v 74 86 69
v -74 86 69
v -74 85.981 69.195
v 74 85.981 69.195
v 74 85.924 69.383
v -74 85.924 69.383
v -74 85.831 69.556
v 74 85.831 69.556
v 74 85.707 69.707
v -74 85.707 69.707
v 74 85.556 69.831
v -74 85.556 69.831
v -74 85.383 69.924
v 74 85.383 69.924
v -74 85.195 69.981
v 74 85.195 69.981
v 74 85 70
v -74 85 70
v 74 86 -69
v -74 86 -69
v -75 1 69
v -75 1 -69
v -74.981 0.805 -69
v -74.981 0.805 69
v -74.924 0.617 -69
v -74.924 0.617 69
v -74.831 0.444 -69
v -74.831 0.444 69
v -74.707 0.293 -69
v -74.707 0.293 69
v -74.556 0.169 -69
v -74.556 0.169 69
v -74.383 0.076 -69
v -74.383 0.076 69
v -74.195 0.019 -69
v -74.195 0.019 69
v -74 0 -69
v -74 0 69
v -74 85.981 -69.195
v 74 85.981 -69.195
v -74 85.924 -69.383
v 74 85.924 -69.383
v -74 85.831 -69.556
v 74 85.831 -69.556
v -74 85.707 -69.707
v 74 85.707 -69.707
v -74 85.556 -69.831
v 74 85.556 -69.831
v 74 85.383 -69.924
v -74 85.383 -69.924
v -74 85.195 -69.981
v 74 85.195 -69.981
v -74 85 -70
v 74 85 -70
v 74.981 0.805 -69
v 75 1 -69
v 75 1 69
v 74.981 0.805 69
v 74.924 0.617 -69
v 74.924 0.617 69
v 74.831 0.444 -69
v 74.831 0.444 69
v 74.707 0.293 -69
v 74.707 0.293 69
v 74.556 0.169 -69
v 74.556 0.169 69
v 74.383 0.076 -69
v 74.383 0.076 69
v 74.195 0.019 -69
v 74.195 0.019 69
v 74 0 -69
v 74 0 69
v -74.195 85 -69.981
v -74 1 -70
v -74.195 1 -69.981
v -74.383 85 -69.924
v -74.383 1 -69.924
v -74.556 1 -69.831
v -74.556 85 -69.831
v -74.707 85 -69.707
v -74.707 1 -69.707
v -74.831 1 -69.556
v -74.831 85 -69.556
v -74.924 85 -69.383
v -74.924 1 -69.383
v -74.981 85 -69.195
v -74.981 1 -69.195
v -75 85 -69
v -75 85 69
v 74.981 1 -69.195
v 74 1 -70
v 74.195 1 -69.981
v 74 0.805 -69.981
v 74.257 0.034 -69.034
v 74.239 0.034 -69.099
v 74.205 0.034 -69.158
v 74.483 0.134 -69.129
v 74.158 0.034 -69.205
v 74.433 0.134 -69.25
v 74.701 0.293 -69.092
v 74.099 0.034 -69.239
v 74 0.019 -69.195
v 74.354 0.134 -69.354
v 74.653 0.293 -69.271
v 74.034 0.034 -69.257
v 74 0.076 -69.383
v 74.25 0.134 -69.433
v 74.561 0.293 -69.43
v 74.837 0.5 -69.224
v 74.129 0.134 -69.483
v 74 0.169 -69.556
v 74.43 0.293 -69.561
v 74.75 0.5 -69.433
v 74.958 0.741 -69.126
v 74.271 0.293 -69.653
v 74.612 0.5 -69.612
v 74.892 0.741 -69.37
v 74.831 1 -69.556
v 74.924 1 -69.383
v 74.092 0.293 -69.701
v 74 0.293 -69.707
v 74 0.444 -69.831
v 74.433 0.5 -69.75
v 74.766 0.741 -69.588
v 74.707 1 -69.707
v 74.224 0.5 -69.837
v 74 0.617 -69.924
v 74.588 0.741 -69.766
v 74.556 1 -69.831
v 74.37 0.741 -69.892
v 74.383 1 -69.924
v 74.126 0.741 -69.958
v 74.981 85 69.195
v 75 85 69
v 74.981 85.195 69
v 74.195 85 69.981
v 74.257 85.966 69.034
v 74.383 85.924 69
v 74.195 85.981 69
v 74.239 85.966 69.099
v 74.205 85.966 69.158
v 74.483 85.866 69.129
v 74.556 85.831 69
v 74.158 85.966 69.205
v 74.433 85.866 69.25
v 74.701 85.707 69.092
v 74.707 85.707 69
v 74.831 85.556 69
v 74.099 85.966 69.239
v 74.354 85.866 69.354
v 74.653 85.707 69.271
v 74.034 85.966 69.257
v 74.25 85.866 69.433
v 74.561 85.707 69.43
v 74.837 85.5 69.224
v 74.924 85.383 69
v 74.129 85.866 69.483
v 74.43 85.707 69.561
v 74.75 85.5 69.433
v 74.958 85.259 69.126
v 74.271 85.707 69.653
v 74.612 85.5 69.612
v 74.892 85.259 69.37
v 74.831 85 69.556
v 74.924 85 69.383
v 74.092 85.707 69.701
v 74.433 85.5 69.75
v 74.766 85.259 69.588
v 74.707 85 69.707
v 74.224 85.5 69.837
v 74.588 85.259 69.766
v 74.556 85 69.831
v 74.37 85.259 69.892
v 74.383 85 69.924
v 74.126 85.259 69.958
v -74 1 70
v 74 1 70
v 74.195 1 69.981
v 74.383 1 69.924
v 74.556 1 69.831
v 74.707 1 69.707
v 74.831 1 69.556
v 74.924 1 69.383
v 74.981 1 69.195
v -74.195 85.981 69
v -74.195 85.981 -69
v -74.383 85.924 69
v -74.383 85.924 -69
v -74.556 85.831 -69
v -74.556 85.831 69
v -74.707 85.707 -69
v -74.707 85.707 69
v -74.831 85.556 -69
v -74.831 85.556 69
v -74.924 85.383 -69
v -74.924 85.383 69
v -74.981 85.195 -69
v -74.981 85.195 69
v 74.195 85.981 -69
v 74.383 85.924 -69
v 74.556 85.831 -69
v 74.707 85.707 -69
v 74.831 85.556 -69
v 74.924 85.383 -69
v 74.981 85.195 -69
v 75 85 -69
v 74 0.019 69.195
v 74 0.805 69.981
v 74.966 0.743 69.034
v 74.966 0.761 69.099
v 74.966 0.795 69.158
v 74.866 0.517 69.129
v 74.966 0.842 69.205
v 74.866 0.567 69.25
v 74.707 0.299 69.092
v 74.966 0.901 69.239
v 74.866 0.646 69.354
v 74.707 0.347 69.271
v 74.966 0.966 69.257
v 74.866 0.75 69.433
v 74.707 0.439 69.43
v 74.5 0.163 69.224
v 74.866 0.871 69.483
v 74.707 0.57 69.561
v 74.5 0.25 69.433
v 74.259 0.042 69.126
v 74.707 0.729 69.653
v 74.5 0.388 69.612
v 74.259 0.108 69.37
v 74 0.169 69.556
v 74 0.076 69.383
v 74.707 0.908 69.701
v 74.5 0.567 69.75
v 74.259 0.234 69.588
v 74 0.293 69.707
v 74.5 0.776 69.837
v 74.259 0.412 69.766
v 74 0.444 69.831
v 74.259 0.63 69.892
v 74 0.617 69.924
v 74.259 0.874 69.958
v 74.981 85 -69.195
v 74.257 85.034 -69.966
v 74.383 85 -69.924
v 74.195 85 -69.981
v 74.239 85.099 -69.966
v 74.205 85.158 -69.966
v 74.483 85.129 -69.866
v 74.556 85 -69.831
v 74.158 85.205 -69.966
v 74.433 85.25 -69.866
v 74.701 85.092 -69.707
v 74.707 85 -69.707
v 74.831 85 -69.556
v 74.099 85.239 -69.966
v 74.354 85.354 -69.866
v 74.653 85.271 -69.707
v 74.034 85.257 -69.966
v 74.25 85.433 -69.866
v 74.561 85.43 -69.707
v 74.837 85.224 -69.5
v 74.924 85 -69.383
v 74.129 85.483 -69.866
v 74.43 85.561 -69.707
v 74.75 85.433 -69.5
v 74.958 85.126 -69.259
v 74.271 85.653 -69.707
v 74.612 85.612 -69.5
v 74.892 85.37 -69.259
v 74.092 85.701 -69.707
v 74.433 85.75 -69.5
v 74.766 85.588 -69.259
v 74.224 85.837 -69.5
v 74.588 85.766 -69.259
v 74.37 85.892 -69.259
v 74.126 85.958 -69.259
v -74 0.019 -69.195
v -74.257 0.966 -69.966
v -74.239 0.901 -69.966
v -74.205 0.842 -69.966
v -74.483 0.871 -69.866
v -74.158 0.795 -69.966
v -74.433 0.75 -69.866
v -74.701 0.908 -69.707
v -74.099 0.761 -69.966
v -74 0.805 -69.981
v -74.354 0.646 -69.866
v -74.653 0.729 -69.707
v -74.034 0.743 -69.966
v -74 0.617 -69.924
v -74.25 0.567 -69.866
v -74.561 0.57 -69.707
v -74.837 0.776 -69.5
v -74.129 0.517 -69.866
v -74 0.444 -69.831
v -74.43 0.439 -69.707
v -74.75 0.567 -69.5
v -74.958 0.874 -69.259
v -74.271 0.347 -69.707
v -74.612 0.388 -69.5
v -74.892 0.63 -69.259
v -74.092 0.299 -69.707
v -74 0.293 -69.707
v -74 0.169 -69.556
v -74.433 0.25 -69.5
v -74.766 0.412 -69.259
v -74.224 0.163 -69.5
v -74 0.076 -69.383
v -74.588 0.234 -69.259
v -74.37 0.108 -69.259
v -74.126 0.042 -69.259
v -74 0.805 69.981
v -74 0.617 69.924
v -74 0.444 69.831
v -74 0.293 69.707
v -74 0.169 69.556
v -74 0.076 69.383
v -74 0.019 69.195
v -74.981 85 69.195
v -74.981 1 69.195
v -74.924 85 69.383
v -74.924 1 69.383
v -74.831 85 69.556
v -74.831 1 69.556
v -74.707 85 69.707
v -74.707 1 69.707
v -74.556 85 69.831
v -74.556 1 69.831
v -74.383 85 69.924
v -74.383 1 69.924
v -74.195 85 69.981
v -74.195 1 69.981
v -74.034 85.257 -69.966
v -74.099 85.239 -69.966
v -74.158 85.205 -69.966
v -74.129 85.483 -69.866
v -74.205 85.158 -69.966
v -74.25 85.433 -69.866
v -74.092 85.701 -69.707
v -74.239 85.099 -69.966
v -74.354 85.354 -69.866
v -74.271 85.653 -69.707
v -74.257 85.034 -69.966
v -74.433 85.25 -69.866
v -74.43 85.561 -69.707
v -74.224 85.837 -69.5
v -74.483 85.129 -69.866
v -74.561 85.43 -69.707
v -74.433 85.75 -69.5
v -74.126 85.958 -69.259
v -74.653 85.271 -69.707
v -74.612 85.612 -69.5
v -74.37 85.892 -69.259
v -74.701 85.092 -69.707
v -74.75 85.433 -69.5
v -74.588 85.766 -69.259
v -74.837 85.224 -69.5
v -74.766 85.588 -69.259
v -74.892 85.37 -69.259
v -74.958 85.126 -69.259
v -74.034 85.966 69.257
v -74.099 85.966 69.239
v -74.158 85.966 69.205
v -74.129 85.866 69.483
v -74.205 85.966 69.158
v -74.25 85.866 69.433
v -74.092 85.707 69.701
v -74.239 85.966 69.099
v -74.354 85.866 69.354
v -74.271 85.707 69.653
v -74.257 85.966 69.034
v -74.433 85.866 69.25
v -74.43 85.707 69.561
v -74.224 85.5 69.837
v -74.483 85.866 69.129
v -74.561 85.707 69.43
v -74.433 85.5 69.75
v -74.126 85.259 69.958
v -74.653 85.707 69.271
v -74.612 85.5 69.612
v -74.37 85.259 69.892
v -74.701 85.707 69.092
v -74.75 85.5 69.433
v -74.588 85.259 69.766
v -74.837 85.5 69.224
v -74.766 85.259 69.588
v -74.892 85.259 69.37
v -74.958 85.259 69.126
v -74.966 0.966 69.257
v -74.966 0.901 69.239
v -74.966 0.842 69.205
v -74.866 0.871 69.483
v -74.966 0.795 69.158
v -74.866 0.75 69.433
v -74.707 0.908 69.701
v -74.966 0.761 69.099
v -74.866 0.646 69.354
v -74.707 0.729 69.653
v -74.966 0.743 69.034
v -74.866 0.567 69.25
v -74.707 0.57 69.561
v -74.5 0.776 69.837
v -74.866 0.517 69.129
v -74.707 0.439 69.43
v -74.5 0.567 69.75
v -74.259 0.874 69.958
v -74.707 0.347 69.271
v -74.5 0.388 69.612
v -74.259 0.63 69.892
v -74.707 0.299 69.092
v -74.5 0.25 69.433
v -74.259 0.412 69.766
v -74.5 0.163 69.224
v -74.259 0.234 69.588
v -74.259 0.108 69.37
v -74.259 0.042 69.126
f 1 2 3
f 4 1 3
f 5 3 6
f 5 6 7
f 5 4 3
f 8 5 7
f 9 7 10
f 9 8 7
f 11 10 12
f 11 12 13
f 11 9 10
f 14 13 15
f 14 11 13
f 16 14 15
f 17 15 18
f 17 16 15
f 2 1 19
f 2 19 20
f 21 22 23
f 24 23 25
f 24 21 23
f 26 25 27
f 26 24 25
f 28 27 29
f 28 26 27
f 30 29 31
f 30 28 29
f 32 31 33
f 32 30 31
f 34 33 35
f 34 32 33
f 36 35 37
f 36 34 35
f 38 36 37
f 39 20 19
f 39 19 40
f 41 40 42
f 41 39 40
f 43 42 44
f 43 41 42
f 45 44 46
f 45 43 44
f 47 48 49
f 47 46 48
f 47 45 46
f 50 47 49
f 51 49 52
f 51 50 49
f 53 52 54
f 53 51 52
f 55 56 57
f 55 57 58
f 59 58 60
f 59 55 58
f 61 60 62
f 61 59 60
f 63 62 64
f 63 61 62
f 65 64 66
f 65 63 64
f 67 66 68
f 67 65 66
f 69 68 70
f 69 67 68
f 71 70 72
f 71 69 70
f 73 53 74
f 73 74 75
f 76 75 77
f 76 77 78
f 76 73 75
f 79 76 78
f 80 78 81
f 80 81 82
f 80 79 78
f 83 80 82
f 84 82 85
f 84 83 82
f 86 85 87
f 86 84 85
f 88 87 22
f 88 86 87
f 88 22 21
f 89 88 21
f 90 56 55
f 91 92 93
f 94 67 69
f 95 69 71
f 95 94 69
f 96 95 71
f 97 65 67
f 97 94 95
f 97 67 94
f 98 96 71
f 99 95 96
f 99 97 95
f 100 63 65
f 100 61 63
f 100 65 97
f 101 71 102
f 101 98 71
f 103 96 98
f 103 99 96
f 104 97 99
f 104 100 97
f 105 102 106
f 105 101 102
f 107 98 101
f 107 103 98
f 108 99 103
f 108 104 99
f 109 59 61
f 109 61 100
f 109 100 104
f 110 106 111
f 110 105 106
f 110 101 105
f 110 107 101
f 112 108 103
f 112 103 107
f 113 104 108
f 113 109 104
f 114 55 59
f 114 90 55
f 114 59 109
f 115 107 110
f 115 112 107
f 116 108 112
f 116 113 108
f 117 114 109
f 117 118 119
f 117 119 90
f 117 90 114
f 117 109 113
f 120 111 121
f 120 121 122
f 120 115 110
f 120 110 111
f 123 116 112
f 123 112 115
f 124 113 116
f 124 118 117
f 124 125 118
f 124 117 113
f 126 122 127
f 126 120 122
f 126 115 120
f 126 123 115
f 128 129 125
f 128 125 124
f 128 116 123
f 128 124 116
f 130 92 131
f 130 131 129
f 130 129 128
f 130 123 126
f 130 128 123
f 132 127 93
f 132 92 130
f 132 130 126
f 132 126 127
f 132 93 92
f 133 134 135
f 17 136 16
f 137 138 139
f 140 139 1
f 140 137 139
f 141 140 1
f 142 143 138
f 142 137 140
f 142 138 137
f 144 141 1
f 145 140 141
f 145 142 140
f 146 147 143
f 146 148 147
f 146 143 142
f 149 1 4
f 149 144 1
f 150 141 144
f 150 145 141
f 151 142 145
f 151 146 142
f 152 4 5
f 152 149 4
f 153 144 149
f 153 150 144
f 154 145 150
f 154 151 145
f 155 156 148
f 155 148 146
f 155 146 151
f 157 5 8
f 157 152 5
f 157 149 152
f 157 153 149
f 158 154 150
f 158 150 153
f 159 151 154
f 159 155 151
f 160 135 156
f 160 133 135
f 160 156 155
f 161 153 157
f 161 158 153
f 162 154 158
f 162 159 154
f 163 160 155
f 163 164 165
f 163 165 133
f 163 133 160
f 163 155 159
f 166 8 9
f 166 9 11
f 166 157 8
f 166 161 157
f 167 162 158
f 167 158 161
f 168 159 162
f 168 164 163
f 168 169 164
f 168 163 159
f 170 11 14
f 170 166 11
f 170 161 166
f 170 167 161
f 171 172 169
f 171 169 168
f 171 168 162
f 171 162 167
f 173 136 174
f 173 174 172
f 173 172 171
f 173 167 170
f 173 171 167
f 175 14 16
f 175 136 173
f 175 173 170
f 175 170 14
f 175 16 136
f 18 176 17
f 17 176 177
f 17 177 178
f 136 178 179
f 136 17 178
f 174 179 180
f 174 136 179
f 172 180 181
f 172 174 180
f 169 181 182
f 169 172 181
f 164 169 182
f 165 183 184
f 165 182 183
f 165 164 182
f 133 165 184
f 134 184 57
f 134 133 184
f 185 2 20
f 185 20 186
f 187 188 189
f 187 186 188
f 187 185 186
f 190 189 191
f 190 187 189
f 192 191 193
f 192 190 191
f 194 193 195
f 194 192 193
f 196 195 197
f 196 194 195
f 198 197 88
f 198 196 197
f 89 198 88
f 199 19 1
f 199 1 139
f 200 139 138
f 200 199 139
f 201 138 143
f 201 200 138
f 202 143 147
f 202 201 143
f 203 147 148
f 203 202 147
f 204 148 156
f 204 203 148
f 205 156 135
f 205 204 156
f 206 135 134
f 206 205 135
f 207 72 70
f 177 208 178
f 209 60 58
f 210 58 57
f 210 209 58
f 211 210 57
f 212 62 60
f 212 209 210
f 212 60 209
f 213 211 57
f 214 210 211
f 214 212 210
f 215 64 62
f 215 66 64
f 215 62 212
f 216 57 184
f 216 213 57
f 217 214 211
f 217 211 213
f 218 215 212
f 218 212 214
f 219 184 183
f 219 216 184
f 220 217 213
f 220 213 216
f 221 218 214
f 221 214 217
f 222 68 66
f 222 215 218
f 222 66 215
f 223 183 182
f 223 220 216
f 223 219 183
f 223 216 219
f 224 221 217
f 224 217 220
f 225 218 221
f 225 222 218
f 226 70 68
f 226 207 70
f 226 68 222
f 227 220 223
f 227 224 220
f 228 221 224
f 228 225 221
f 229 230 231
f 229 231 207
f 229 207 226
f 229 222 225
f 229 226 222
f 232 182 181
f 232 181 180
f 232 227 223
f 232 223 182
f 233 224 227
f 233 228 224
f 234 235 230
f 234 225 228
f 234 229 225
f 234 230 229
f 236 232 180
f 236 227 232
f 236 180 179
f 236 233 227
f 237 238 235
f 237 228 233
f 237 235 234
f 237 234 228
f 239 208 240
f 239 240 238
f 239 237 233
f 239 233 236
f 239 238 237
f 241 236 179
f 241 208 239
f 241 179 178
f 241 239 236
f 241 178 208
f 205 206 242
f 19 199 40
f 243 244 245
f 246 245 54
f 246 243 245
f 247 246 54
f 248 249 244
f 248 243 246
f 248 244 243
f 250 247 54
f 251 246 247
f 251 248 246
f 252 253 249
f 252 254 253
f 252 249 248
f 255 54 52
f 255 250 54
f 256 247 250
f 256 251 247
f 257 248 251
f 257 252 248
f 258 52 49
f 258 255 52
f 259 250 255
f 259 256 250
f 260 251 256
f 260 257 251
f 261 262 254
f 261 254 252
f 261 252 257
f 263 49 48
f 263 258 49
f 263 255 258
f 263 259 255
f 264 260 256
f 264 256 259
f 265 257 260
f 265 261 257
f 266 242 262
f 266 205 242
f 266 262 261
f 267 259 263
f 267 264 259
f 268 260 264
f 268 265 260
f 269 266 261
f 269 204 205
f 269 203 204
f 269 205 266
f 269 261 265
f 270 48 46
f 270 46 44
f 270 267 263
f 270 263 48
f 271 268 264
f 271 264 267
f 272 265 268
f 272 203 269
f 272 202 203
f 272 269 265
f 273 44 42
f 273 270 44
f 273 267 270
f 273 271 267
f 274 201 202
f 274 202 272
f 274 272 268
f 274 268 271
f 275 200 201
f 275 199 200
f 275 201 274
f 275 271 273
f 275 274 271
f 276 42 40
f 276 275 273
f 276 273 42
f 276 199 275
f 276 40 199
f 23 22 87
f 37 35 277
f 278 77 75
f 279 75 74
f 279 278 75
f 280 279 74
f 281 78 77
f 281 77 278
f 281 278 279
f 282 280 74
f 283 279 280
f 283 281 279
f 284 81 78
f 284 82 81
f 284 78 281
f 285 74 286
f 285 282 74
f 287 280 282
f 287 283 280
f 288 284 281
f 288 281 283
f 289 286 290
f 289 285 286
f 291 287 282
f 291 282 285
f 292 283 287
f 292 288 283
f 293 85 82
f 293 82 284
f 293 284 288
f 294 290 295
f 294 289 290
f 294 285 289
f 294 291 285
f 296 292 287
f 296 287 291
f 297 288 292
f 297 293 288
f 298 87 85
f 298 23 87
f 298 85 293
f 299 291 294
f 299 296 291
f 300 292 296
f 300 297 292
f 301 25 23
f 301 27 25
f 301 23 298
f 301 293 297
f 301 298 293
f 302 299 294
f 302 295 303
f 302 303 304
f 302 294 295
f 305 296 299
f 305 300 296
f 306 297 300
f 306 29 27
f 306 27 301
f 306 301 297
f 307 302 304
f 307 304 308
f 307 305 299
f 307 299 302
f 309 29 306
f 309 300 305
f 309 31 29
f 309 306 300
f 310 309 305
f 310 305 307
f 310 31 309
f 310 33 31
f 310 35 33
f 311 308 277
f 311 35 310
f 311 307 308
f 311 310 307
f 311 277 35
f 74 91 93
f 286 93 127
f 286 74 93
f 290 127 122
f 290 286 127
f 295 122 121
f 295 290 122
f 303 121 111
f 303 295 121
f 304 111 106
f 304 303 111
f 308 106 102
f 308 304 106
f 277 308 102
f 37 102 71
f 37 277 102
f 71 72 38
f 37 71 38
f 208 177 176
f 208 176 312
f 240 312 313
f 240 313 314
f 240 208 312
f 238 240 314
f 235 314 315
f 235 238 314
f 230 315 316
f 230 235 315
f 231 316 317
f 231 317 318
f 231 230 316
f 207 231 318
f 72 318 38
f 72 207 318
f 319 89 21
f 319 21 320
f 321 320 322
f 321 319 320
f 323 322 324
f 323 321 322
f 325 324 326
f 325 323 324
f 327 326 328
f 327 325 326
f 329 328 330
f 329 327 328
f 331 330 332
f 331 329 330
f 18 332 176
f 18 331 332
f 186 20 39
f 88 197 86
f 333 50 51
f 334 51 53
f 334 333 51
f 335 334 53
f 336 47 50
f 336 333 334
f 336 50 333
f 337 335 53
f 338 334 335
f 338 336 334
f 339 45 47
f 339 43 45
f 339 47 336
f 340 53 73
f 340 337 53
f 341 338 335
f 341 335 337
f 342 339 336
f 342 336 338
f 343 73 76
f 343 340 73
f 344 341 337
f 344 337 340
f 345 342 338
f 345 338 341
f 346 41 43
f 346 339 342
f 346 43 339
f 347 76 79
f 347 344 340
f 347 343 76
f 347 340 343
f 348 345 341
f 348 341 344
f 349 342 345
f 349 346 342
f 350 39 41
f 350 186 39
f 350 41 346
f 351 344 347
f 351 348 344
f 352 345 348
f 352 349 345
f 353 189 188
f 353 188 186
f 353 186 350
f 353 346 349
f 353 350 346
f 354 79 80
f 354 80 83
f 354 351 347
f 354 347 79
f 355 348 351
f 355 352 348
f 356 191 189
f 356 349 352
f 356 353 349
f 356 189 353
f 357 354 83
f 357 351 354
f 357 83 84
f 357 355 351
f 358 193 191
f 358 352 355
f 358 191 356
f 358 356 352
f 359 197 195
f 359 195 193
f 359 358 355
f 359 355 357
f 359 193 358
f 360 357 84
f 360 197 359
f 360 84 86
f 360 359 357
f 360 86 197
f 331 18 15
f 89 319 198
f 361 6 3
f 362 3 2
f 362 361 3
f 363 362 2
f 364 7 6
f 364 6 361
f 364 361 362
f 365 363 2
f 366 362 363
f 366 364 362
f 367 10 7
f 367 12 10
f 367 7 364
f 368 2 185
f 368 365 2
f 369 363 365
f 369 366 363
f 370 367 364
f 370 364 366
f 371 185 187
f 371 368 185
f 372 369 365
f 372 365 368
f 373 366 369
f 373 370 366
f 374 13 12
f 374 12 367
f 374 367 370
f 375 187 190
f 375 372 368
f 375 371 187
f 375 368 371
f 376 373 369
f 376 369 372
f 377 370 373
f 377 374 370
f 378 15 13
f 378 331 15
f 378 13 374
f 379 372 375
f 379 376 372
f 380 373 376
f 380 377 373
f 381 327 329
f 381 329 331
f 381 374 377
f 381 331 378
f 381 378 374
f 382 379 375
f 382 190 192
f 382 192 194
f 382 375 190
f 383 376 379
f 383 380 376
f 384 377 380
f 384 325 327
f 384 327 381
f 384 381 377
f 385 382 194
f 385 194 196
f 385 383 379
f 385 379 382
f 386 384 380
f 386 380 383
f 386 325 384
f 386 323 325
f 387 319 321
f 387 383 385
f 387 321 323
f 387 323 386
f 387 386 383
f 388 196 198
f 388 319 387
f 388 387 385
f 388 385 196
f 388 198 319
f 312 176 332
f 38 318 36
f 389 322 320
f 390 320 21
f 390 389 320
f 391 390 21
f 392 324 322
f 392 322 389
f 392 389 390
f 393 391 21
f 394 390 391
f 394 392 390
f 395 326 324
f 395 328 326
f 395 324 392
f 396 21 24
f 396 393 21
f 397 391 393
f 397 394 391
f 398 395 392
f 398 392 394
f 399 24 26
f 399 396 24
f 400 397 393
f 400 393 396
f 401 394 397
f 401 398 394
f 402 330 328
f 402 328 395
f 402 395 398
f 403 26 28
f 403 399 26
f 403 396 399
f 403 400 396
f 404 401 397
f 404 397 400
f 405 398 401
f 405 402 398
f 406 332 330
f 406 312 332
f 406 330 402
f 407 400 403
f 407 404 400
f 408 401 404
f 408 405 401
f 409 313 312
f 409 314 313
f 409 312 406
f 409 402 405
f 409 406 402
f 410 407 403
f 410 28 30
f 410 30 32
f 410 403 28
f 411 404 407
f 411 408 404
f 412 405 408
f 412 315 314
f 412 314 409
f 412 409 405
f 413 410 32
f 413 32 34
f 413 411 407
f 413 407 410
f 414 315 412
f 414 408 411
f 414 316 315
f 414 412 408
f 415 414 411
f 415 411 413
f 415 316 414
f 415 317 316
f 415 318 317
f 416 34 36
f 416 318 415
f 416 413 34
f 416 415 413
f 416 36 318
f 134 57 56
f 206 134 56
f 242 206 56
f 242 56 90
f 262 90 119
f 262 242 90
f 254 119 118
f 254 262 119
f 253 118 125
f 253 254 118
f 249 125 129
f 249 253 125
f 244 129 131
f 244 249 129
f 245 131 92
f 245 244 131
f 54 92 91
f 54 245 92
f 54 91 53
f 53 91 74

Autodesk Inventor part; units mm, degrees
ref_plane "YZ Plane" through (0, 0, 0) normal (1, 0, 0) x (0, 1, 0)
ref_plane "XZ Plane" through (0, 0, 0) normal (0, 1, 0) x (-1, 0, 0)
ref_plane "XY Plane" through (0, 0, 0) normal (0, 0, 1) x (1, 0, 0)
sketch "Sketch1" plane through (0, 0, 0) normal (0, 1, 0) x (-1, 0, 0)
  line L0 (-75, -70) -> (75, -70)
  line L1 (75, -70) -> (75, 70)
  line L2 (75, 70) -> (-75, 70)
  line L3 (-75, 70) -> (-75, -70)
  point P0 (0, 0)
  dimension "d0" = 150
  dimension "d1" = 140
  dimension "d4" = 70
  dimension "d5" = 75
extrude "Extrusion1" add sketch "Sketch1" along normal blind 86
fillet "Fillet1" radius 1 12 edges at (0, 0, 70) (-75, 43, 70) (-75, 86, 0) (-75, 0, 0) (-75, 43, -70) (75, 43, 70) (0, 86, 70) (75, 86, 0) (75, 43, -70) (0, 86, -70) (0, 0, -70) (75, 0, 0)
properties part number "PSU"
